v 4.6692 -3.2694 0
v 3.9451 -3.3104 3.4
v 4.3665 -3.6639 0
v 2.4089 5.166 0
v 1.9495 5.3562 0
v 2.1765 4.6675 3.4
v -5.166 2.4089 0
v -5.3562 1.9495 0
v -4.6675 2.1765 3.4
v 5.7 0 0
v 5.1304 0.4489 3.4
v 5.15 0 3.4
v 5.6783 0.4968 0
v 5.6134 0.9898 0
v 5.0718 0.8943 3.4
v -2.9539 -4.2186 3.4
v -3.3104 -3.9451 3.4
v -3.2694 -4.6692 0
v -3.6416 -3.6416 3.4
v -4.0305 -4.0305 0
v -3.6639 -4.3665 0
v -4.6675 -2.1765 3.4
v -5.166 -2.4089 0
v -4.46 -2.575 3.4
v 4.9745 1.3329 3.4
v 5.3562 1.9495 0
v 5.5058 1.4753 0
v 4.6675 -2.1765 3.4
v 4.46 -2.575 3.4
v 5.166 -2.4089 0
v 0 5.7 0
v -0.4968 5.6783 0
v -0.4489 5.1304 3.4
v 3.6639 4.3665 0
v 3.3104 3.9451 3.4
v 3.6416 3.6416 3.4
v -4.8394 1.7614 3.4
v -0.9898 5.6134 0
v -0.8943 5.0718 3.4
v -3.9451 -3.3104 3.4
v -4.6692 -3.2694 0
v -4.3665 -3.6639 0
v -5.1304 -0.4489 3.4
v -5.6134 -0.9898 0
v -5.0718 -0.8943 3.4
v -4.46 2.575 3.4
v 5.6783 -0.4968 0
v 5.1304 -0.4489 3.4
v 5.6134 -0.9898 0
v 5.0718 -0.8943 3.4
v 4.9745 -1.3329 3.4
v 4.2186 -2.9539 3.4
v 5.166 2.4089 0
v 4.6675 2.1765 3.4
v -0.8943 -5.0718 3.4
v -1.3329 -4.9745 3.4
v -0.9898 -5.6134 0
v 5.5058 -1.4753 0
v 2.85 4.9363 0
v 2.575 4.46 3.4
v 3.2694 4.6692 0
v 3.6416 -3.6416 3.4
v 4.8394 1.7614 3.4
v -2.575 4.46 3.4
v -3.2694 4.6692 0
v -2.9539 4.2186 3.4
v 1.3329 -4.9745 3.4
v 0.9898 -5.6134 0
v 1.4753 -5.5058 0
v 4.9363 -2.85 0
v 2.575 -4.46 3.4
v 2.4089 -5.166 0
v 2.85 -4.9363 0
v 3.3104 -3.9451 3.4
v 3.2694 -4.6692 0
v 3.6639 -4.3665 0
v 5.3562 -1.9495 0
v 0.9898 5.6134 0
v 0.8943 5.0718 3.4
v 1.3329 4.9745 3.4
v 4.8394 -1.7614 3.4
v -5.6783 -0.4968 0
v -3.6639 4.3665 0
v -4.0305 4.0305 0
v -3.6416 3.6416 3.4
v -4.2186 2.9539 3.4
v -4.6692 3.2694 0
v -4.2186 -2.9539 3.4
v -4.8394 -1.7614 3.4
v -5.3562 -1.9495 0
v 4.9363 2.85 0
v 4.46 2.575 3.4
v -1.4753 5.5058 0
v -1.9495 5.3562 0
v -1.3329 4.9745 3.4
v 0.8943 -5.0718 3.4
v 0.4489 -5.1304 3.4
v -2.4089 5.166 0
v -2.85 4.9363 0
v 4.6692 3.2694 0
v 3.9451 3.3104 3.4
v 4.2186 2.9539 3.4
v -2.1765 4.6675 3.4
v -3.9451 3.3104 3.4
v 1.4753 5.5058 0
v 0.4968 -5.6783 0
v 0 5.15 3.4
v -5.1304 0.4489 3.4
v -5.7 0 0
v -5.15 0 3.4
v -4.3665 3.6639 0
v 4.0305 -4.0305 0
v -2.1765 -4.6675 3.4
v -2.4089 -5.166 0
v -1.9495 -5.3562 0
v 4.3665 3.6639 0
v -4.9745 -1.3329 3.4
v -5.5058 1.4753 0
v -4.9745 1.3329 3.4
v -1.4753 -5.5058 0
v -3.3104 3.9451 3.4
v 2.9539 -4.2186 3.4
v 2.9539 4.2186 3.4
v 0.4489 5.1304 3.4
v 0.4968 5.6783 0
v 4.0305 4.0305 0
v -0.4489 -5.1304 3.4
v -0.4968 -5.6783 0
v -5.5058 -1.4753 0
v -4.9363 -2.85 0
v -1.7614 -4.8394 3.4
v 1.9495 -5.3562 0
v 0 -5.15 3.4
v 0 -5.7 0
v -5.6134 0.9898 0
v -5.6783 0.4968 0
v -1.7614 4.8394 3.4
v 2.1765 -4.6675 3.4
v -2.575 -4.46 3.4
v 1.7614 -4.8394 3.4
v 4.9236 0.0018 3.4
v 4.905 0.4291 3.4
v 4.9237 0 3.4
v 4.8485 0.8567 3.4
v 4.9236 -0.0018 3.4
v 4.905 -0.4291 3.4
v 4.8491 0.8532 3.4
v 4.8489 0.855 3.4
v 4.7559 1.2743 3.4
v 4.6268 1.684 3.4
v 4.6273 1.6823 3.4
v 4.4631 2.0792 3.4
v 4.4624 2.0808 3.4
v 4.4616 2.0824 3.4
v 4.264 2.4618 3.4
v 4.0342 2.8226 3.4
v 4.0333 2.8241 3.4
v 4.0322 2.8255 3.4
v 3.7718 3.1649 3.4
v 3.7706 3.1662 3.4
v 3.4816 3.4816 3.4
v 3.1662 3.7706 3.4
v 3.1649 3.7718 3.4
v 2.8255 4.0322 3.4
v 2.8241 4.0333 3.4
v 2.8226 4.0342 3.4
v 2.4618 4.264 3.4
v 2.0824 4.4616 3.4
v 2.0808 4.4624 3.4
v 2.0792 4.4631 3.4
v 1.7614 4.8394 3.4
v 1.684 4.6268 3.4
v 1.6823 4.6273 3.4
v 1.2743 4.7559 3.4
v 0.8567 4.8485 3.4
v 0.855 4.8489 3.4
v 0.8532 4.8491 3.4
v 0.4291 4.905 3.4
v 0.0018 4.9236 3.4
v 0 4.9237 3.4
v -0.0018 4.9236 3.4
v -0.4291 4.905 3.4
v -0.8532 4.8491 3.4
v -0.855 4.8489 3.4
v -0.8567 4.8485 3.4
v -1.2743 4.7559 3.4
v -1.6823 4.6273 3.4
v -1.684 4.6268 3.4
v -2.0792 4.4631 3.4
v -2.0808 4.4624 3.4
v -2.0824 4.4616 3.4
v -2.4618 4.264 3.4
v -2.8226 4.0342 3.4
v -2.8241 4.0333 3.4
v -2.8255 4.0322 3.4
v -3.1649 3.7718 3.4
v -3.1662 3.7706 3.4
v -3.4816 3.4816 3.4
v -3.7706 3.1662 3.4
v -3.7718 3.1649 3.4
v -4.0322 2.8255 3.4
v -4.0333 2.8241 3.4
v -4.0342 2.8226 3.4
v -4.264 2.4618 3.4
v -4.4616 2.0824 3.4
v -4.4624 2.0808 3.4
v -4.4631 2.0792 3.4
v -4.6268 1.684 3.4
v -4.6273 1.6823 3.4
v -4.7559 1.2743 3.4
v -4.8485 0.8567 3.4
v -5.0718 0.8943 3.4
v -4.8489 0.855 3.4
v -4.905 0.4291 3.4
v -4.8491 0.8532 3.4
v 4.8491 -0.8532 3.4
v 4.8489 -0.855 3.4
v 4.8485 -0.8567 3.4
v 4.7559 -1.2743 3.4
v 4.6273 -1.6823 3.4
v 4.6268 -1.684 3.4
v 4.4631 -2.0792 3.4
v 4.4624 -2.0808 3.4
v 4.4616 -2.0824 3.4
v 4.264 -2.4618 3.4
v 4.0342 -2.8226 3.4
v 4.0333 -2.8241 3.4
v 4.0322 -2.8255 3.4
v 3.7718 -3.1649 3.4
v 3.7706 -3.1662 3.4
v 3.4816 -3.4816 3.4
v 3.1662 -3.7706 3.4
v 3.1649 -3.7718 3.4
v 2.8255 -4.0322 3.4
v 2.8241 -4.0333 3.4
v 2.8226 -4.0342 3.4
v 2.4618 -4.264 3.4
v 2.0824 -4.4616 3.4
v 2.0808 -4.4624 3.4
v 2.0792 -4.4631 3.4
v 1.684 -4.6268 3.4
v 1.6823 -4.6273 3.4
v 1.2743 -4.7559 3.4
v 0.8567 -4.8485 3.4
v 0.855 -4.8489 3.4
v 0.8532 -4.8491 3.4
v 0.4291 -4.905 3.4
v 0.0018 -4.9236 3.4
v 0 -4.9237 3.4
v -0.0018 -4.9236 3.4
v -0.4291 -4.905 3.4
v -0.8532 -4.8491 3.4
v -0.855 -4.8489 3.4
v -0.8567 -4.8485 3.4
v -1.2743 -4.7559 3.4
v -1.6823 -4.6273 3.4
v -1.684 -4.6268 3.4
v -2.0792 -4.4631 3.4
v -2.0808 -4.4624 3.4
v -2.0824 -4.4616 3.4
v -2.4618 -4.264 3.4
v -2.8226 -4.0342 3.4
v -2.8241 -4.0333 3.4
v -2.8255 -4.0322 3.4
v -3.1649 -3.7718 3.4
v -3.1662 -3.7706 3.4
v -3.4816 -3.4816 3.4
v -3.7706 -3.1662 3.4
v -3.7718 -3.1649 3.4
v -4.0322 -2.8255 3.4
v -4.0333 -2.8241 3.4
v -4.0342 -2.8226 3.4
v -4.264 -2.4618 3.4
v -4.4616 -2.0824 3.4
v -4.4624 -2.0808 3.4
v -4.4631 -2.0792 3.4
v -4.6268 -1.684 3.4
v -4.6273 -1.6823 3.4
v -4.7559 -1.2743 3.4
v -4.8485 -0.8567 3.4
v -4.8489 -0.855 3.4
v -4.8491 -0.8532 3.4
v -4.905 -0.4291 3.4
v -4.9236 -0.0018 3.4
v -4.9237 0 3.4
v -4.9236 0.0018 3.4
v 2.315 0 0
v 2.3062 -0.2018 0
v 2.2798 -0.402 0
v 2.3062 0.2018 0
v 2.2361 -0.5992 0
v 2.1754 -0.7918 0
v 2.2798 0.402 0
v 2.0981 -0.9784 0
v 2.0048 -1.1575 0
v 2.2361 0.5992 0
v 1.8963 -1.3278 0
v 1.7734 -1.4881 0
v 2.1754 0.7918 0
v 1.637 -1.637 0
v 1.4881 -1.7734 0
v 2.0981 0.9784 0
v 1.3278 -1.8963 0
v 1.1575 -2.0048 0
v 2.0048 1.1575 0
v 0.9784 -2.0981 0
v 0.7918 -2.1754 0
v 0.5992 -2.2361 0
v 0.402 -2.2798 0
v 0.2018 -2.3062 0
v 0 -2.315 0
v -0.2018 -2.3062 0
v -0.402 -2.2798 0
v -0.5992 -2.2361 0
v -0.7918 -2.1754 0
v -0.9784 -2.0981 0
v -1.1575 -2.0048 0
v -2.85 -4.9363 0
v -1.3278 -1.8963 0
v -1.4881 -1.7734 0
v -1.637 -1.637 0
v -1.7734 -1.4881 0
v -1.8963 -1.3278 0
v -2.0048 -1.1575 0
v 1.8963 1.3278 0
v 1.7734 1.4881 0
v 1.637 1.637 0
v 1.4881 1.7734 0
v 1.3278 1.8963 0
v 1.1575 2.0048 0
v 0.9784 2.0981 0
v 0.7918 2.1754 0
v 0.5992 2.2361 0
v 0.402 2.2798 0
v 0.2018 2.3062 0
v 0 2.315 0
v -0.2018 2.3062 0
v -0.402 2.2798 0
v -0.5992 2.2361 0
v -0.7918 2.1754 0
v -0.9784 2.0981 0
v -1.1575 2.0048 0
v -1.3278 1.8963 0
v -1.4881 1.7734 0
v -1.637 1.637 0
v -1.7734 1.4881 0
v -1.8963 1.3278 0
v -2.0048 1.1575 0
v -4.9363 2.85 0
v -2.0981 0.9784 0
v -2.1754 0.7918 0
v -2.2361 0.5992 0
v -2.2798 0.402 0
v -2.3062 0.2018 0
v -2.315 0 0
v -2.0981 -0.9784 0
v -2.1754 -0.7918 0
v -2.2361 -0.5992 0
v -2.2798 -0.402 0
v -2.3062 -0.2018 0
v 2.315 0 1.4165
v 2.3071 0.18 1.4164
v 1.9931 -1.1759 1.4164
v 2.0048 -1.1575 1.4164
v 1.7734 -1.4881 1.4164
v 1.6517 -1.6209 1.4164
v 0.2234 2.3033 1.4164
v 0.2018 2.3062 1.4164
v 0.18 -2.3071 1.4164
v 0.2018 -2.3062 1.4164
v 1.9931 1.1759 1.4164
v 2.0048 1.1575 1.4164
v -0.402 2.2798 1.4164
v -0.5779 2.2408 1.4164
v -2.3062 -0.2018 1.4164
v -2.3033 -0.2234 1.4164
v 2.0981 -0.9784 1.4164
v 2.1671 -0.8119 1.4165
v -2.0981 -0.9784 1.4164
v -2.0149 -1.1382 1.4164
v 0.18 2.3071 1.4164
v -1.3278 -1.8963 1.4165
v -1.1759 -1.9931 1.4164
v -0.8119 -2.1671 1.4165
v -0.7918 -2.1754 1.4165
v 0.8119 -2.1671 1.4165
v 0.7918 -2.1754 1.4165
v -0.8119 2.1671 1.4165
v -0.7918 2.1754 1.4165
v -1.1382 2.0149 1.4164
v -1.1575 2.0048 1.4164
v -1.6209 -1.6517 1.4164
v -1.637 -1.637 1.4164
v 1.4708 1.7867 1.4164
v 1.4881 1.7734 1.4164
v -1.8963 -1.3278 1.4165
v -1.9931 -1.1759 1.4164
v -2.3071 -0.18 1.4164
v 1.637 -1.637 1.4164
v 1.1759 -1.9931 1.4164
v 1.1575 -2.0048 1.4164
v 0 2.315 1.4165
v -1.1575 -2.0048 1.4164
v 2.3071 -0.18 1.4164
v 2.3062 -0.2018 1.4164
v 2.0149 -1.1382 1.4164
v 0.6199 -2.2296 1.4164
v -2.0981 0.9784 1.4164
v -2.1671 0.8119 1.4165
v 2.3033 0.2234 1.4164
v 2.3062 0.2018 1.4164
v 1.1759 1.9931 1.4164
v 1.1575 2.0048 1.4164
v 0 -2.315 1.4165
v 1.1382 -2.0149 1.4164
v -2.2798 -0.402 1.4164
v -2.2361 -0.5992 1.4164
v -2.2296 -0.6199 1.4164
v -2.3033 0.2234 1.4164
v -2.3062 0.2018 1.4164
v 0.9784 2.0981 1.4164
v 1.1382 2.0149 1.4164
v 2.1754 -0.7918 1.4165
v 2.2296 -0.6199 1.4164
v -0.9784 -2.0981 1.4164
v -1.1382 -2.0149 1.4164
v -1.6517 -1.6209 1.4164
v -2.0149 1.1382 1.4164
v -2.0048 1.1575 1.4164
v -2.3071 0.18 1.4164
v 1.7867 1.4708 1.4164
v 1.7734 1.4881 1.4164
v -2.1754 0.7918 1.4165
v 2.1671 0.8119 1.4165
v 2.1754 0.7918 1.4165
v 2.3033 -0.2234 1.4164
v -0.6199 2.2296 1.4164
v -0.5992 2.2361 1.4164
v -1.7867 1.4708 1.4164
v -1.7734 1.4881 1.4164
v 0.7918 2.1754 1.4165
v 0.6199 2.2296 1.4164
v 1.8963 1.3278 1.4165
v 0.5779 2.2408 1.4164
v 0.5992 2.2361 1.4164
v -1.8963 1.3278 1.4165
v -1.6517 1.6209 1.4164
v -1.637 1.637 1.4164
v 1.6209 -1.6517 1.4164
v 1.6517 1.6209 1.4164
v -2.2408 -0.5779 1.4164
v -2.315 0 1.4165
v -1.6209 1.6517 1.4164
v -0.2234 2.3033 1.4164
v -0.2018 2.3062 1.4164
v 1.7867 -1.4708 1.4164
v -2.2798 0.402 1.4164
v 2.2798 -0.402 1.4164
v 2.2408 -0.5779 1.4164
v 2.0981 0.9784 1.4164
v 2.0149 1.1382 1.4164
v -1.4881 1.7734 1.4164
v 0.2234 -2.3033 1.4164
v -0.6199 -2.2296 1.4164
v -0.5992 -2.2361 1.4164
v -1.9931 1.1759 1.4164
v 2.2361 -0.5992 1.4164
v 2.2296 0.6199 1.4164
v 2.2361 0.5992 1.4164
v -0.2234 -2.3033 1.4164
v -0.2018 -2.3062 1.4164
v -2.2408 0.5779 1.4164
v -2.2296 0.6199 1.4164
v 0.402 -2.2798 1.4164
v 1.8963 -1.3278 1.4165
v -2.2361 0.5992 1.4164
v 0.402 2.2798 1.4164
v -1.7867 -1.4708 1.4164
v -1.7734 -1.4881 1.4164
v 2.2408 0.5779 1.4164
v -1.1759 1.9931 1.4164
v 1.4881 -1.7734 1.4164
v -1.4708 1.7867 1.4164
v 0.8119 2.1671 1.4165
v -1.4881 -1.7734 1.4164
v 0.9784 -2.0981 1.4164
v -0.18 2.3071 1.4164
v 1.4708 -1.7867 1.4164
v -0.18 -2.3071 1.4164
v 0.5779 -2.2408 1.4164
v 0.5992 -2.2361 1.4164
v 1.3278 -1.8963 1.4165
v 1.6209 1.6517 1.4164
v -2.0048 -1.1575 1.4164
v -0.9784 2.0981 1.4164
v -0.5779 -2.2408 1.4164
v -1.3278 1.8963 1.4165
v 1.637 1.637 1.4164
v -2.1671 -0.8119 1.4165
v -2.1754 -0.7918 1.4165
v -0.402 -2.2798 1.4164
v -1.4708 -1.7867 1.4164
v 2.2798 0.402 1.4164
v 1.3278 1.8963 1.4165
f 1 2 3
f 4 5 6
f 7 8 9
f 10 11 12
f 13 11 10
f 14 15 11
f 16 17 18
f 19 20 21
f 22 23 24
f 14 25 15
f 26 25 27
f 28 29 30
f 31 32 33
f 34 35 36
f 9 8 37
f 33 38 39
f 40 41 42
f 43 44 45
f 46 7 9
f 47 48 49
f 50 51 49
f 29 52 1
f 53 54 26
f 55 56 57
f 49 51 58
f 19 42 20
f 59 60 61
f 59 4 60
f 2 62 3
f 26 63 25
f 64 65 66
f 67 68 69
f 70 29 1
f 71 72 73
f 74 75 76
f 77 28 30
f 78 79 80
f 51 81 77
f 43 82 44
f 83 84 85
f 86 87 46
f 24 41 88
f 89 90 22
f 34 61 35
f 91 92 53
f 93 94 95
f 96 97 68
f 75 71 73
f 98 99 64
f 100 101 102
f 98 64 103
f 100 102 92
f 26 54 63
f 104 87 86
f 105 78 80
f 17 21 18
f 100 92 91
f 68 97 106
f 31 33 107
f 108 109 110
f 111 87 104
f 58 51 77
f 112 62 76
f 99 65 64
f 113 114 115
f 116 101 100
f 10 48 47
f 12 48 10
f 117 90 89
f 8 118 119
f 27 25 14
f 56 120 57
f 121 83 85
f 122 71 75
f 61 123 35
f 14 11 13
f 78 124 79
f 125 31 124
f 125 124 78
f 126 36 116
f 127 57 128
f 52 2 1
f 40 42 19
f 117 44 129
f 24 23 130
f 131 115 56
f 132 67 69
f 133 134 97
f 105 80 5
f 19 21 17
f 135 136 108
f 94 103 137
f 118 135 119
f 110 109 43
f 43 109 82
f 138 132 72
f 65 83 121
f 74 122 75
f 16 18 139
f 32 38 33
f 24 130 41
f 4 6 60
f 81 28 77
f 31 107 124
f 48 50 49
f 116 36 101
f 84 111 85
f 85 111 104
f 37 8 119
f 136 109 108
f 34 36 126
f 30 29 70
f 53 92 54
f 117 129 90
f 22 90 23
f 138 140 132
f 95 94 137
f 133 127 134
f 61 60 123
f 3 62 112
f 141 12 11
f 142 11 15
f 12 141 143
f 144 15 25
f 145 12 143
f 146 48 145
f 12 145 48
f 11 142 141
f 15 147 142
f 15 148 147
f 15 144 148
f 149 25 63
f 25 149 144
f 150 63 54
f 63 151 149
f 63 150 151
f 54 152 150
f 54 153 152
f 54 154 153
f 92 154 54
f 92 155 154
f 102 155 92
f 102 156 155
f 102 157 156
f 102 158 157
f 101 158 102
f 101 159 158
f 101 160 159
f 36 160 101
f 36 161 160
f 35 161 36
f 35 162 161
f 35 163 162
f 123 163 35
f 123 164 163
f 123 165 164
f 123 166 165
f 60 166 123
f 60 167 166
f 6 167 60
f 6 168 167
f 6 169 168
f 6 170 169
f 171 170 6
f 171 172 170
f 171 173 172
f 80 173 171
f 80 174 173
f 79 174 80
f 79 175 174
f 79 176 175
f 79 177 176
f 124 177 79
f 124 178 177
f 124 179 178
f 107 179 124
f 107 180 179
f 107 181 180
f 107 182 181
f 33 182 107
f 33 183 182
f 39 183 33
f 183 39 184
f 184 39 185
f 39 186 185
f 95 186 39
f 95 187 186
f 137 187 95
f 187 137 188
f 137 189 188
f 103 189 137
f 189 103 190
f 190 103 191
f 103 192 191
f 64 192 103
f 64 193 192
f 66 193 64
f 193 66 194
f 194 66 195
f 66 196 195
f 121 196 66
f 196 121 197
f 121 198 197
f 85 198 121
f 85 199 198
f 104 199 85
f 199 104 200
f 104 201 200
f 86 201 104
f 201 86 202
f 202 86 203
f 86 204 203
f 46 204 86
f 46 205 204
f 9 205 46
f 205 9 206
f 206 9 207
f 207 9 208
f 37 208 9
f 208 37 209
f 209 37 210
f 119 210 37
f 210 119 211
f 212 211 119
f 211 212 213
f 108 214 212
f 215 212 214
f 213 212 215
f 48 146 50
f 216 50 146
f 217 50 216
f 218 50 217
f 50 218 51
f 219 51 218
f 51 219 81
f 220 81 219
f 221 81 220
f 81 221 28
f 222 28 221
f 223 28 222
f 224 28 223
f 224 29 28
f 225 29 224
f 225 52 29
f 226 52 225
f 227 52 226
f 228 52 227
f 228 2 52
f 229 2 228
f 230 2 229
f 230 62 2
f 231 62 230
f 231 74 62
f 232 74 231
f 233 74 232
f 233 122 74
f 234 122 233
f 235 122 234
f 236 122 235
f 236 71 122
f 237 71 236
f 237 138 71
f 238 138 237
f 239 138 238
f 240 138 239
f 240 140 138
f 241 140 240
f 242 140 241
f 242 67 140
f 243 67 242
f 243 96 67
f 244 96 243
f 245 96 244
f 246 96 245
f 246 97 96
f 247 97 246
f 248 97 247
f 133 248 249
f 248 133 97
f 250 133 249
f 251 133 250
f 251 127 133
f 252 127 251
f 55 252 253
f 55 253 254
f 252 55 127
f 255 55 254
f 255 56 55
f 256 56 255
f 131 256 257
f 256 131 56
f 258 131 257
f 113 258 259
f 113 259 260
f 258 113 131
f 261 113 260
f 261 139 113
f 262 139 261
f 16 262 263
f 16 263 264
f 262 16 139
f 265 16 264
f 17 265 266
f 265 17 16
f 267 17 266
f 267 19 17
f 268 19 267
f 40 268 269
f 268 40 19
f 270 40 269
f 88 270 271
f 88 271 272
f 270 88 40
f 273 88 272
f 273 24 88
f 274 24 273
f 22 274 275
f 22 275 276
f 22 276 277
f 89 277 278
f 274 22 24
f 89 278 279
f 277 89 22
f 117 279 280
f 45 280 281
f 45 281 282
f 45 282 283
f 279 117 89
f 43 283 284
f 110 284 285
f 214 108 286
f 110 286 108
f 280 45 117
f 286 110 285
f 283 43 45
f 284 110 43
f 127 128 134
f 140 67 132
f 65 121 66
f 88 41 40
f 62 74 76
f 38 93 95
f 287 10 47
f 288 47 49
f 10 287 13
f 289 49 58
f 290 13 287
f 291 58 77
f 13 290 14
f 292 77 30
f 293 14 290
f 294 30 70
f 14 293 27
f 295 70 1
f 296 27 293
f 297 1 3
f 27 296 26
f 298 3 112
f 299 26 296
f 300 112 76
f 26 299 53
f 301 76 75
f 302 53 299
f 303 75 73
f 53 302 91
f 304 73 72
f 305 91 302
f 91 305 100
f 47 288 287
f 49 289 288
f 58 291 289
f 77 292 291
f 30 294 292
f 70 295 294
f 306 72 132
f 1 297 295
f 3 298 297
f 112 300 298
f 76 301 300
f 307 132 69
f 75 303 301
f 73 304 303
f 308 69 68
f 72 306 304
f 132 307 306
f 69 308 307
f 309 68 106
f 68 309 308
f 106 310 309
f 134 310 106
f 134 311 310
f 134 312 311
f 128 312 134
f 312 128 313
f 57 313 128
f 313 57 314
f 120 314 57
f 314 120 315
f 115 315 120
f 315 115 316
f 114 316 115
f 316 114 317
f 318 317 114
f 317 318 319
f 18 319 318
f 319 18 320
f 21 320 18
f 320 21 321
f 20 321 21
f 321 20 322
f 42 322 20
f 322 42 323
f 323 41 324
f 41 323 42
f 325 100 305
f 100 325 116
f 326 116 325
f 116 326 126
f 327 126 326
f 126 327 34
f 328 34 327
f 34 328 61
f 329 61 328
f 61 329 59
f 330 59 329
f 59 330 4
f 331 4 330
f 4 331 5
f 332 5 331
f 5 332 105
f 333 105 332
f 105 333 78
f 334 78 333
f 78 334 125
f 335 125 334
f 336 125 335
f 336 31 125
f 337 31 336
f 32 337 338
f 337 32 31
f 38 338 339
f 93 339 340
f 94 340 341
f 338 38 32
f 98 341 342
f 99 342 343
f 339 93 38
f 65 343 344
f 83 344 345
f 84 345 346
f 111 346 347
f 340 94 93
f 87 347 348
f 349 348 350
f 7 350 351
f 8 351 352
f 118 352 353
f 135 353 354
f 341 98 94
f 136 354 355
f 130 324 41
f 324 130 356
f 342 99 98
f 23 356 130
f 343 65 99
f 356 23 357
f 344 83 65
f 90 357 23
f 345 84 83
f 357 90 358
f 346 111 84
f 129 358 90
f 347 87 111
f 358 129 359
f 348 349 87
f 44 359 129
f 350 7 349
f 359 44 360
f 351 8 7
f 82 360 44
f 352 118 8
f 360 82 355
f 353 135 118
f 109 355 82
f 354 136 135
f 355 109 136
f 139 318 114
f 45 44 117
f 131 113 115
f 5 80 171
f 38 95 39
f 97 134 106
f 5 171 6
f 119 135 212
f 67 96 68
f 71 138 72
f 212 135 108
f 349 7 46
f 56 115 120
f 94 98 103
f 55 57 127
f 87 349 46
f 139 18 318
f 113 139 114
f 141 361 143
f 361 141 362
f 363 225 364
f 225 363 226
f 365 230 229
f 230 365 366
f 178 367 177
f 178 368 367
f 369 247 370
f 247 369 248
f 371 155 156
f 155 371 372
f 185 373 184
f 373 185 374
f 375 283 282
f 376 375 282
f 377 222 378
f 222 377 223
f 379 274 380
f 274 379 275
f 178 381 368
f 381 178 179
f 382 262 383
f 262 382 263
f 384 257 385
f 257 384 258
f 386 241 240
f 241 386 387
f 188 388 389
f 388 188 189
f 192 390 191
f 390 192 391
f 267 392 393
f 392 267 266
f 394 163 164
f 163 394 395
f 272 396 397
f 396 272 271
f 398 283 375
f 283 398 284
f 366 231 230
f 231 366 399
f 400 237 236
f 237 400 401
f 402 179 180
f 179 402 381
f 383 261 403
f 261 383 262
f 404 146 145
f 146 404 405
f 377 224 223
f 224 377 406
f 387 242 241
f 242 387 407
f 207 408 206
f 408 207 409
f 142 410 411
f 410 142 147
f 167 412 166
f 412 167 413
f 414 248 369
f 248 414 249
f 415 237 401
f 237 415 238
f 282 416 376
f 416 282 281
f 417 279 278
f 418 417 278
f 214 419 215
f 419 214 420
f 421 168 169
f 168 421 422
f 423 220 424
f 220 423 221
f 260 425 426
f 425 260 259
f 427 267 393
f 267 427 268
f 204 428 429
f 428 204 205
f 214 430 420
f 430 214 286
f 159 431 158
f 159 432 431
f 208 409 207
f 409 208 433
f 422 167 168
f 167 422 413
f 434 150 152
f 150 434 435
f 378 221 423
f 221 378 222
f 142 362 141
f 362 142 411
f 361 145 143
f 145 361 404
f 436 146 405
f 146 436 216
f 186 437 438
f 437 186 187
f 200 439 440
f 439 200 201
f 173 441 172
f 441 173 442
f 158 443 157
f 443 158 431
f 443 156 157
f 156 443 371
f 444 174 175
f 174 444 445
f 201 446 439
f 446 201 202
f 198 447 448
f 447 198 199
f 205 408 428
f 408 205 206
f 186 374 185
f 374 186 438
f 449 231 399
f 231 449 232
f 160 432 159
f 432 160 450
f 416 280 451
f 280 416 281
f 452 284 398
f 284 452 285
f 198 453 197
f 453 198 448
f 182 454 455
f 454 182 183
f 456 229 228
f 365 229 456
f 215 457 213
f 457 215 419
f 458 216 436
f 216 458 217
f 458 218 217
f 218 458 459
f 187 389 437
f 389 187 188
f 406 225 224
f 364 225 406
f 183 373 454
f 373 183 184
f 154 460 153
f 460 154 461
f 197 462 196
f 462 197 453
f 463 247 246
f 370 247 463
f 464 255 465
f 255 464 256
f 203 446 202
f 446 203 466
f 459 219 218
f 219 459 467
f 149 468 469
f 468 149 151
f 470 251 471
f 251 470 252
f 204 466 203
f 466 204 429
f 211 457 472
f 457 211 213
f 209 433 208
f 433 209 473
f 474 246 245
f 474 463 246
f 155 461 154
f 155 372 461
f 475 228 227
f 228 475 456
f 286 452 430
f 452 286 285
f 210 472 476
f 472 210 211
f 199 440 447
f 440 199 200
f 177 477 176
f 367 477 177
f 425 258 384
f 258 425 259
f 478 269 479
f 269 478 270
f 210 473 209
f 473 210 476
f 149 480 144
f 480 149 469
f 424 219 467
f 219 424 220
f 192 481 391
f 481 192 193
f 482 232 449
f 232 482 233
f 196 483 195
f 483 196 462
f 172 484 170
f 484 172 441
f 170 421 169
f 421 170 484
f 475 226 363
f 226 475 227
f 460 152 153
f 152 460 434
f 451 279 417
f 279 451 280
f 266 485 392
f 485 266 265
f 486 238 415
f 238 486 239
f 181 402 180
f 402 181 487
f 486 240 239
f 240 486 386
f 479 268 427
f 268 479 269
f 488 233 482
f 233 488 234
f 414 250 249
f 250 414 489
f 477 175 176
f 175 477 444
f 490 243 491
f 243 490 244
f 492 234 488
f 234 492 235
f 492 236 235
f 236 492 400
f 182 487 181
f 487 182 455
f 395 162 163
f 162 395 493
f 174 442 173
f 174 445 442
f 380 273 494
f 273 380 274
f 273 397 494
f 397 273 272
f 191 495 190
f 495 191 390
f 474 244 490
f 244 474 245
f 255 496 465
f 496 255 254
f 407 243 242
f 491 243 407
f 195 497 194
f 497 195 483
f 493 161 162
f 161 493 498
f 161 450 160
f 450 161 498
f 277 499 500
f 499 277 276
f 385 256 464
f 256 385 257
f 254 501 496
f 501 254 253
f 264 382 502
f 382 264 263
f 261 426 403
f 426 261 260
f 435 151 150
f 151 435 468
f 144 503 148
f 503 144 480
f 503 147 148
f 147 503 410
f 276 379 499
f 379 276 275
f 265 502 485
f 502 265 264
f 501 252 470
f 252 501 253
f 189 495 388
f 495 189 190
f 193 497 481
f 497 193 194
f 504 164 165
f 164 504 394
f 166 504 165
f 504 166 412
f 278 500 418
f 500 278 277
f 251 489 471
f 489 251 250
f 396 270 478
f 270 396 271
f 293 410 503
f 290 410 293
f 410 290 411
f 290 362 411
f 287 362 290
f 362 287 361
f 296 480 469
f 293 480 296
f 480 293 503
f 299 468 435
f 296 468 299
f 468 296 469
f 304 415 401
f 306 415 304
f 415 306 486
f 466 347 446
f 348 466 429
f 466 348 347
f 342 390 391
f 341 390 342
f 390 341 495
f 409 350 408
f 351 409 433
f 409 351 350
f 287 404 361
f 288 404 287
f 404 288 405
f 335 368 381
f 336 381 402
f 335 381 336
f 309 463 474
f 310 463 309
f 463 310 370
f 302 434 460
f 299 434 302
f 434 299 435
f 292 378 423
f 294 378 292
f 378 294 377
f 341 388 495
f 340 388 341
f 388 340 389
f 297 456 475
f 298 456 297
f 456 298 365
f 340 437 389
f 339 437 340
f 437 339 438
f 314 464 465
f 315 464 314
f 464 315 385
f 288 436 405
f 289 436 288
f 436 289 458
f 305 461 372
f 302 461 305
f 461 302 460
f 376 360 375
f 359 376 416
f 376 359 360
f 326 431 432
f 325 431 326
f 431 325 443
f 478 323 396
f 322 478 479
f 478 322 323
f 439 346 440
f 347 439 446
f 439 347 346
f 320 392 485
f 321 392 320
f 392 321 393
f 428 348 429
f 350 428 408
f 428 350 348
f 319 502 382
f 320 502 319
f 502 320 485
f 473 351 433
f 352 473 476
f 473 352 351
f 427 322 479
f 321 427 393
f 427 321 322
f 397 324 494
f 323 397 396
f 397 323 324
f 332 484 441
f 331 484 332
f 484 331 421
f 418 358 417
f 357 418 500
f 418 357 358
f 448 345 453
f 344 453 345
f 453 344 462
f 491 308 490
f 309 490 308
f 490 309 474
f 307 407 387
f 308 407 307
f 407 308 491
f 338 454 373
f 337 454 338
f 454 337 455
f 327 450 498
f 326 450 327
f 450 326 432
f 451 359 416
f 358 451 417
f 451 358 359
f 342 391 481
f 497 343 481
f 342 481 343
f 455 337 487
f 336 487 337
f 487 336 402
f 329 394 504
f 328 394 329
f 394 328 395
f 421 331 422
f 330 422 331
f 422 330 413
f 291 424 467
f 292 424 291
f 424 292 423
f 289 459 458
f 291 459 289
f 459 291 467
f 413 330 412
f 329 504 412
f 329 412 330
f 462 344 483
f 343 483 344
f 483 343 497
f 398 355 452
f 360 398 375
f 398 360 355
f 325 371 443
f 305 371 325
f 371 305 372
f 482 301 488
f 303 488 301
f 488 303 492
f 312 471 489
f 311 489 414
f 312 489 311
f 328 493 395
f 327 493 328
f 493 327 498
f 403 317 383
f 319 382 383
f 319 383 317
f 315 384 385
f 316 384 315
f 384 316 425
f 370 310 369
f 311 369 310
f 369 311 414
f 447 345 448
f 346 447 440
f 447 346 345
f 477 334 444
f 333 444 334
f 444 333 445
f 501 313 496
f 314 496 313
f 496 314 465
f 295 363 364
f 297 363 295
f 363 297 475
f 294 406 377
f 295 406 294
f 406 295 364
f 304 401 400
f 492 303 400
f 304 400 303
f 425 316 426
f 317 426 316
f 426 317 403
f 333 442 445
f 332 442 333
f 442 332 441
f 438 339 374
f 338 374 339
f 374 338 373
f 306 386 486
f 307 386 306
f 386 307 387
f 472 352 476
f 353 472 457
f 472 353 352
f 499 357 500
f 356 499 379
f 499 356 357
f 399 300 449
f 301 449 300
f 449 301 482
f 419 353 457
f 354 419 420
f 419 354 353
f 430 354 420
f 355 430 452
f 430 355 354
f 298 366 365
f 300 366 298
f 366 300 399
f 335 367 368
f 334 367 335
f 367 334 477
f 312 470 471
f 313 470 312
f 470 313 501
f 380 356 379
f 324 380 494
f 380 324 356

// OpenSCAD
// -- Uke Friction Tuner Washer Replacement -- //
// -- Simple OpenSCAD Script by Ryan Pavlik -- //

// If you're editing this by hand:
// Ignore stuff that is in brackets - that's special comments for Thingiverse Customizer to parse
// Also, sorry for the long lines in some of the comments, hopefully you're editing using the
// built-in editor in OpenSCAD or another editor with soft word-wrap. Customizer can only
// deal with one comment line per parameter.

// -- Configuration Parameters -- //
// These are what I measured for mine, but they might not be right for you.
// Calipers time! Units are mm.

// *     Define the Outside      * //
// the yellow surfaces in OpenSCAD //
/* [outside] */

// Overall height of the desired washer - measure existing washer.
height = 3.4;

// Diameter of outside of washer at base (uke head) - measure existing washer.
outerBaseDiameter = 11.4;

// Diameter of outside of washer at top (furthest from head) - measure existing washer.
outerTopDiameter = 10.3;


// *      Define the Inside Cone     * //
// (sloped green surfaces in OpenSCAD) //
/* [inside-cone] */

// height of inner sloped portion - measure on tuner key
innerHeight = 2.1;

// Diameter of inner portion at the top and presumably widest part of the key - measure on key.
innerTopDiameter = 9.9;

// Diameter of inner portion at the base and presumably narrowest part of the key - measure on key.
innerBaseDiameter = 4.35;

// *   Define the Inside Cylinder   * //
// (other green surfaces in OpenSCAD) //
/* [inside-cylinder] */

// Largest diameter of the pin that goes through this. Clearance gets added automatically. It's important that this is the *largest* diameter because the pin probably has flat sides - but we want a round hole.
pinDiameter = 4.23;

// -- shouldn't need to edit below here -- //

/* [Advanced-slash-Troubleshooting] */
// value added to pin diameter for clearance. one 0.4mm nozzle-width seemed OK to me: a little snug, but you wouldn't want it loose. You probably don't need to change this unless you printed one and you either can't fit it on the pin, or it's a sloppy fit on the pin..
pinClearance = 0.4;

/* [hidden] */
// Let's really-well approximate these circles.
$fa = 5;
$fs = 0.1;
// for Customizer - what tab is open? used to highlight.
preview_tab = "";
// For Customizer - to make messages readable, since the real geometry is radially symmetric
// preview[view:south, tilt:top]

// for messages - some unicode characters
GT = "\u003E";
LEQ = "\u2264";
GEQ = "\u2265";

// -- parameter validation and warning messages -- //
// Parameter validation: diameters of each cone.
// Outer cone flares at base.
if (outerBaseDiameter <= outerTopDiameter)
    warning("outerBaseDiameter", LEQ, "outerTopDiameter", "You may have your parameters flip-flopped. Outer cone should flare at the bottom in this design.");

// Inner cone flares at top.
if (innerTopDiameter <= innerBaseDiameter)
    warning("innerTopDiameter", LEQ, "innerBaseDiameter", "You may have your parameters flip-flopped. Inner cone should flare at the top in this design.");

// Parameter validation: heights
if (height <= innerHeight)
    warning("height", LEQ, "innerHeight", "You almost certainly have at least one of these values wrong, or the values swapped: the inner cone shouldn't be taller than the entire object overall.");

// Parameter validation: Pin vs inner base diameter - I almost made this one just modify the inner base diameter to be the same as the pin diameter, since in practice they'll be very close, but...
if (pinDiameter > innerBaseDiameter)
    warning("pinDiameter", GT, "innerBaseDiameter", "By the measuring instructions, innerBaseDiameter should be at least pinDiameter.");

// Parameter validation: Pin diameter vs other diameters that it should be definitely smaller than.
if (pinDiameter >= innerTopDiameter)
    warning("pinDiameter", GEQ, "innerTopDiameter", "At least one of these values is likely to be wrong.");
if (pinDiameter >= outerTopDiameter)
    warning("pinDiameter", GEQ, "outerTopDiameter", "At least one of these values is likely to be wrong.");
if (pinDiameter >= outerBaseDiameter)
    warning("pinDiameter", GEQ, "outerTopDiameter", "At least one of these values is likely to be wrong.");

// The actual geometry: One truncated cone, with another truncated cone and a cylinder
// subtracted from it.
// "difference()" takes the first solid as a "positive",
// and subtracts all additional solids (2 in this case) from it, as "negatives".
// Ignore the "highlight()" stuff - that's just to make Customizer on Thingiverse work better.
difference() {
    // Uses of this small "epsilon" value scattered here are just to push surfaces past each other
    // for the boolean ops, so we don't have faces coinciding when performing differences.
    // Sometimes not strictly necessary, but it makes the preview more usable and
    // the math done by the software more reliable.
    epsilon = 0.01;
    
    // This line creates the outer truncated cone.
    highlight("outside") cylinder(d1 = outerBaseDiameter, d2 = outerTopDiameter, h = height);
    
    // The remaining lines then subtract from that initial solid.
    // First, these 3 lines create a truncated cone at the top (hence translate),
    // to match the slope on the key
    highlight("inside-cone") translate([0,0, height - innerHeight + epsilon]) {
        cylinder(d1 = innerBaseDiameter, d2 = innerTopDiameter, h = innerHeight + epsilon);
    }
    // These lines create a simple (right) cylinder (not a cone) all the way through for the pin.
    // Made it taller than the positive, and translated it down, so faces don't coincide.
    highlight("inside-cylinder") translate([0,0, -epsilon]) {
        cylinder(d = pinDiameter + pinClearance, h = height + 2 * epsilon);
    }
}

// Used to highlight in Customizer preview. Ignore otherwise.
// Based on Customizer docs.
module highlight(this_tab) {
    if (preview_tab == this_tab) {
        color("red") children();
    } else {
        children();
    }
}

module warning(var1, relation, var2, details) {
    // full message only seen if not in customizer.
    condition = str(var1, " ", relation, " ", var2);
    fullmsg = str("<b>WARNING</b>: ", condition, " -- ", details);
    echo(fullmsg);
    if (preview_tab != "") {
        !translate([-15, 10, 0]) {
            text(str("WARNING: ", condition), size = 1);
        }
    }
}
